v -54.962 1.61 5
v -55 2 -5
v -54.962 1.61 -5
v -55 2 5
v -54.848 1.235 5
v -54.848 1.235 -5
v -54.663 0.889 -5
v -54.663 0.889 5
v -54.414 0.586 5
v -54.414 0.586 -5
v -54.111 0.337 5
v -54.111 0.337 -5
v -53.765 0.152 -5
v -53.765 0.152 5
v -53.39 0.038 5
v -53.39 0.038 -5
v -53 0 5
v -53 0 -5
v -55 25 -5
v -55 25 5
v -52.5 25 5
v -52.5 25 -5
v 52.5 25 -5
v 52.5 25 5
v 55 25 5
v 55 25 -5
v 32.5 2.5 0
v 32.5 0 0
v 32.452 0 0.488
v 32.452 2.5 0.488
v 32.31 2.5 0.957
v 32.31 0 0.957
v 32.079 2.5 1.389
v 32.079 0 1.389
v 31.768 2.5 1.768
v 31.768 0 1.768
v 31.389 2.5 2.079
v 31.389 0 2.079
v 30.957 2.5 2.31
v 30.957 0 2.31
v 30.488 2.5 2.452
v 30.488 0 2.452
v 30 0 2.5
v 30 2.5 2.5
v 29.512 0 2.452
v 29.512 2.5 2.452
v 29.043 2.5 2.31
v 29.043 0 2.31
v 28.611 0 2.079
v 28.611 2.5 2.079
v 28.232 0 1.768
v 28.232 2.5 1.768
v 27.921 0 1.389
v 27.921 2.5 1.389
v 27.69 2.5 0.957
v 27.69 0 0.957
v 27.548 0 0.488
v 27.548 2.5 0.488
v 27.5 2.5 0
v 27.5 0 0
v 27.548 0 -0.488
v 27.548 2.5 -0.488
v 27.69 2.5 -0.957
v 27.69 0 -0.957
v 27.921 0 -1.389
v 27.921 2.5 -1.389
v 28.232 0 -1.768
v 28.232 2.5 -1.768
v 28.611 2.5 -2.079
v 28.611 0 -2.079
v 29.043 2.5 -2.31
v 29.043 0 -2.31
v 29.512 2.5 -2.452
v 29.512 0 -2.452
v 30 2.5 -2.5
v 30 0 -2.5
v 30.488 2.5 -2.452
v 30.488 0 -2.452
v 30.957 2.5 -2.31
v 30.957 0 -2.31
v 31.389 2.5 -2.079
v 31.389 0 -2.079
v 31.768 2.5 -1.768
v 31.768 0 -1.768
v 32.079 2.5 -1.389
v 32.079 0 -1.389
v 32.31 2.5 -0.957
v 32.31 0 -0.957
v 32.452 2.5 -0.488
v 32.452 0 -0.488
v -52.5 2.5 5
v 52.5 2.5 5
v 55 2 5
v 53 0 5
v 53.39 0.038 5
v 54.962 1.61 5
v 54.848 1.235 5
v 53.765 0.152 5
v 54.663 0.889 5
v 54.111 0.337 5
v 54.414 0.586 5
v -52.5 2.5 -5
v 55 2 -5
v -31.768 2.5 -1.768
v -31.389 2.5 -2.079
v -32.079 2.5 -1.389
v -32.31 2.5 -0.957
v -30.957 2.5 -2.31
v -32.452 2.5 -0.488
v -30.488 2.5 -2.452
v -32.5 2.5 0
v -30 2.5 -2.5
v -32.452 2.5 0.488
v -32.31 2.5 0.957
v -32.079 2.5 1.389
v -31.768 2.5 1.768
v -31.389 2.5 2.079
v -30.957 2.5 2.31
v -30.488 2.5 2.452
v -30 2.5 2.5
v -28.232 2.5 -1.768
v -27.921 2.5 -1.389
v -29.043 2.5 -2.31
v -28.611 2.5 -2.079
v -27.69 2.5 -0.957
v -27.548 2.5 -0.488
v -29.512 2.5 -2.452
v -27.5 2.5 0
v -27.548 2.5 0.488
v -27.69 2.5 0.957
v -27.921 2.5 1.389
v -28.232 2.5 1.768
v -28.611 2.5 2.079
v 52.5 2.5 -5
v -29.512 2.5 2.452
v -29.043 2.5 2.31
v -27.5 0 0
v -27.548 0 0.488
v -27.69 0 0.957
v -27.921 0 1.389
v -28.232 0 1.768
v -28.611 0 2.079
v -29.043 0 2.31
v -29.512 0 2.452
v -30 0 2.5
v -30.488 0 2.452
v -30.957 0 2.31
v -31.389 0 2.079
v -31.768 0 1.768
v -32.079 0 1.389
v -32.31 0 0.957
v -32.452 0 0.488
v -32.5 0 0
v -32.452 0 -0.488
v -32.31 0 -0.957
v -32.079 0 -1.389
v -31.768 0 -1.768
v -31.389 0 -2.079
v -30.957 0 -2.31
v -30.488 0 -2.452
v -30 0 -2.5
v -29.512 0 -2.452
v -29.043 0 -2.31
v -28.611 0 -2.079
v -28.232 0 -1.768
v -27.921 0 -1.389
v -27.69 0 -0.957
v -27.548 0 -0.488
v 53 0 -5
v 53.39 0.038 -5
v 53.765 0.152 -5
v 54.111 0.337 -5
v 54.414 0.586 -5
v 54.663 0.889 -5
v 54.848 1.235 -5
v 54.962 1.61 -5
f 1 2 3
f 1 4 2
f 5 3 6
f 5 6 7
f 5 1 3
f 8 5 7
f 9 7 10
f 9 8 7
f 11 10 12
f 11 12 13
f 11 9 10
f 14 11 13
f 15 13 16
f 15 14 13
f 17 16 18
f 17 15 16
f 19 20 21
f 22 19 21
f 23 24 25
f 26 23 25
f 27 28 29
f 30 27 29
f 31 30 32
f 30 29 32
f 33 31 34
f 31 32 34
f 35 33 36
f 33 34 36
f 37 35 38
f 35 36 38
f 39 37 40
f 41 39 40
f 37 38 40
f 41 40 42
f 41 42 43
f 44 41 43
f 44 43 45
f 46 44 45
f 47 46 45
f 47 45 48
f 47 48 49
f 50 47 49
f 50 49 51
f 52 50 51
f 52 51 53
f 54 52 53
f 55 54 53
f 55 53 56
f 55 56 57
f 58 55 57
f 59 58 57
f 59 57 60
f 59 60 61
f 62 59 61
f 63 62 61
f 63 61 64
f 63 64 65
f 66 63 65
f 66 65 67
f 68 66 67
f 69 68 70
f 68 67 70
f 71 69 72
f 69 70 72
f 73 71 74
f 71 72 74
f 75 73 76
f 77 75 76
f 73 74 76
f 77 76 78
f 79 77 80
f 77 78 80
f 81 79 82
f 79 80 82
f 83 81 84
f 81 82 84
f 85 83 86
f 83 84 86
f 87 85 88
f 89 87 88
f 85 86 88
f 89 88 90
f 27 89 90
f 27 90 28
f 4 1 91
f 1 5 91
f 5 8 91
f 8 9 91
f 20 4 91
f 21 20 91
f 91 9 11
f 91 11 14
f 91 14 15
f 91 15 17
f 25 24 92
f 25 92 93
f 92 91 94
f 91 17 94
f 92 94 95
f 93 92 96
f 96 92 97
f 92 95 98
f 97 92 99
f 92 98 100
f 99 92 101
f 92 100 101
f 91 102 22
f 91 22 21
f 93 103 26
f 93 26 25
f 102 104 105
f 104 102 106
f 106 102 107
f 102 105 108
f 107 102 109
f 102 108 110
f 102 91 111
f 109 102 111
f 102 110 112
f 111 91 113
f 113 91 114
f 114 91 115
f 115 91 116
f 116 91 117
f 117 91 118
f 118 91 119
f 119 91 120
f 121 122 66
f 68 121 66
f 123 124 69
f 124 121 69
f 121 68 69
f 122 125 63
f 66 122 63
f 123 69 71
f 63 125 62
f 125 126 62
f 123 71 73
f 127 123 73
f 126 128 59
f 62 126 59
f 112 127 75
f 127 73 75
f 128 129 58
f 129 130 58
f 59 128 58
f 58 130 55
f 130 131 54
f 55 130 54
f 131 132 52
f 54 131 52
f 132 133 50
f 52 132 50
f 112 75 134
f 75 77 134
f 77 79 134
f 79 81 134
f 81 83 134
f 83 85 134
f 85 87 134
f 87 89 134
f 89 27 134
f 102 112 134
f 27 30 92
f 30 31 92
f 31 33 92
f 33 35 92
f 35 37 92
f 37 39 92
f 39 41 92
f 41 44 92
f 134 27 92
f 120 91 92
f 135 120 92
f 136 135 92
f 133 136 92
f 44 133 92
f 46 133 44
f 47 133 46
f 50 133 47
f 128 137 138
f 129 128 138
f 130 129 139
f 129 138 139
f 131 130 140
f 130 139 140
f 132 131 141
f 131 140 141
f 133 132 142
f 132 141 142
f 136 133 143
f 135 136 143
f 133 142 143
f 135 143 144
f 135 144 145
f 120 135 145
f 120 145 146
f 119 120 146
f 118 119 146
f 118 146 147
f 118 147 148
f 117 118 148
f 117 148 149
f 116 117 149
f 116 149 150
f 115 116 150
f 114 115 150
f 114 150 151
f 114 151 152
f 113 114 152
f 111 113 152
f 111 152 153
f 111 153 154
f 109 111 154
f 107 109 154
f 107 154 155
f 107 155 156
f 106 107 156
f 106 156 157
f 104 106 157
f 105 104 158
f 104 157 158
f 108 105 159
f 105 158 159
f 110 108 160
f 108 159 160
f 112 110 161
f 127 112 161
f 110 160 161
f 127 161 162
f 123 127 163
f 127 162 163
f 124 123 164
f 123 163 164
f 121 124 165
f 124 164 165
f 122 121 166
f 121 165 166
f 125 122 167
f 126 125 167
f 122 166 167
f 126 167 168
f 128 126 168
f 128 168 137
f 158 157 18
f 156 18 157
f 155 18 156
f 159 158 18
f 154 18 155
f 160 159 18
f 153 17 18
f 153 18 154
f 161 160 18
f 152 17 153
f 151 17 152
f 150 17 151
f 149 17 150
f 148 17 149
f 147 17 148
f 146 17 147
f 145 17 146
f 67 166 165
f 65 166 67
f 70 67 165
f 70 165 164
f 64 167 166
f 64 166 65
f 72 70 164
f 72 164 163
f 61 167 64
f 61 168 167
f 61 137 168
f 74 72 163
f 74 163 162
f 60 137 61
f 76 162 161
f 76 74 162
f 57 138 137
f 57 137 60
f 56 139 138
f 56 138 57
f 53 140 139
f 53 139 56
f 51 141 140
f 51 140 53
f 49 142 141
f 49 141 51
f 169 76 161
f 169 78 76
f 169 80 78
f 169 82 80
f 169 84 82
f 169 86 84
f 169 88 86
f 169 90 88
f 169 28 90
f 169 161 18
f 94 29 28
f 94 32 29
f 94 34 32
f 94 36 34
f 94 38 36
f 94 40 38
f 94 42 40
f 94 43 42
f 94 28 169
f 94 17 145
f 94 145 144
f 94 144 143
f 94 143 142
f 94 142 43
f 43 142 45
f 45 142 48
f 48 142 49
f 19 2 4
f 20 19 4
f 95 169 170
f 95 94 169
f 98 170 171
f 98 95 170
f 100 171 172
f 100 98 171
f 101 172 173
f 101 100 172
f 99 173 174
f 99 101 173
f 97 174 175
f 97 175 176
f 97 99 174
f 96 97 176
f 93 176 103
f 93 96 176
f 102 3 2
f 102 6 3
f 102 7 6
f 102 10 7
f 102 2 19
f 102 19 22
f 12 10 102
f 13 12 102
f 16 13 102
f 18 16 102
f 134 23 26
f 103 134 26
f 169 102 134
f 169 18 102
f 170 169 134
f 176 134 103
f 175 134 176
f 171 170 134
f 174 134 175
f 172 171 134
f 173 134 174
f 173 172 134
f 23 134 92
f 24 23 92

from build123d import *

# Parameters (mm, degrees)
F0_W     = 110
F0_H     = 10
F0_R     = 2.5
F1_DEPTH = 25
F2_T     = -2.5
F3_R     = 2


# Not quite as in the source:
# - a feature names something its author has since deleted; it is built from what else it names


with BuildPart() as f1:
    # F0 (on Front) → F1 (new body)
    with BuildSketch(Plane.XZ):
        Rectangle(F0_W, F0_H)
        with Locations((-30, 0)):
            Circle(F0_R, mode=Mode.SUBTRACT)
        with Locations((30, 0)):
            Circle(F0_R, mode=Mode.SUBTRACT)
    extrude(amount=-F1_DEPTH)

    # F2
    f2_openings = [f1.faces().sort_by_distance(p)[0] for p in [
        (0, 12.5, -5),
        (0, 25, 0),
        (0, 12.5, 5),
        (-32.5, 12.5, 0),
        (27.5, 12.5, 0),
    ]]
    offset(amount=F2_T, openings=f2_openings)

    # F3
    f3_edges = [f1.edges().sort_by_distance(p)[0] for p in [
        (-55, 0, 0),
        (55, 0, 0),
    ]]
    fillet(f3_edges, radius=F3_R)


solid = f1.part
